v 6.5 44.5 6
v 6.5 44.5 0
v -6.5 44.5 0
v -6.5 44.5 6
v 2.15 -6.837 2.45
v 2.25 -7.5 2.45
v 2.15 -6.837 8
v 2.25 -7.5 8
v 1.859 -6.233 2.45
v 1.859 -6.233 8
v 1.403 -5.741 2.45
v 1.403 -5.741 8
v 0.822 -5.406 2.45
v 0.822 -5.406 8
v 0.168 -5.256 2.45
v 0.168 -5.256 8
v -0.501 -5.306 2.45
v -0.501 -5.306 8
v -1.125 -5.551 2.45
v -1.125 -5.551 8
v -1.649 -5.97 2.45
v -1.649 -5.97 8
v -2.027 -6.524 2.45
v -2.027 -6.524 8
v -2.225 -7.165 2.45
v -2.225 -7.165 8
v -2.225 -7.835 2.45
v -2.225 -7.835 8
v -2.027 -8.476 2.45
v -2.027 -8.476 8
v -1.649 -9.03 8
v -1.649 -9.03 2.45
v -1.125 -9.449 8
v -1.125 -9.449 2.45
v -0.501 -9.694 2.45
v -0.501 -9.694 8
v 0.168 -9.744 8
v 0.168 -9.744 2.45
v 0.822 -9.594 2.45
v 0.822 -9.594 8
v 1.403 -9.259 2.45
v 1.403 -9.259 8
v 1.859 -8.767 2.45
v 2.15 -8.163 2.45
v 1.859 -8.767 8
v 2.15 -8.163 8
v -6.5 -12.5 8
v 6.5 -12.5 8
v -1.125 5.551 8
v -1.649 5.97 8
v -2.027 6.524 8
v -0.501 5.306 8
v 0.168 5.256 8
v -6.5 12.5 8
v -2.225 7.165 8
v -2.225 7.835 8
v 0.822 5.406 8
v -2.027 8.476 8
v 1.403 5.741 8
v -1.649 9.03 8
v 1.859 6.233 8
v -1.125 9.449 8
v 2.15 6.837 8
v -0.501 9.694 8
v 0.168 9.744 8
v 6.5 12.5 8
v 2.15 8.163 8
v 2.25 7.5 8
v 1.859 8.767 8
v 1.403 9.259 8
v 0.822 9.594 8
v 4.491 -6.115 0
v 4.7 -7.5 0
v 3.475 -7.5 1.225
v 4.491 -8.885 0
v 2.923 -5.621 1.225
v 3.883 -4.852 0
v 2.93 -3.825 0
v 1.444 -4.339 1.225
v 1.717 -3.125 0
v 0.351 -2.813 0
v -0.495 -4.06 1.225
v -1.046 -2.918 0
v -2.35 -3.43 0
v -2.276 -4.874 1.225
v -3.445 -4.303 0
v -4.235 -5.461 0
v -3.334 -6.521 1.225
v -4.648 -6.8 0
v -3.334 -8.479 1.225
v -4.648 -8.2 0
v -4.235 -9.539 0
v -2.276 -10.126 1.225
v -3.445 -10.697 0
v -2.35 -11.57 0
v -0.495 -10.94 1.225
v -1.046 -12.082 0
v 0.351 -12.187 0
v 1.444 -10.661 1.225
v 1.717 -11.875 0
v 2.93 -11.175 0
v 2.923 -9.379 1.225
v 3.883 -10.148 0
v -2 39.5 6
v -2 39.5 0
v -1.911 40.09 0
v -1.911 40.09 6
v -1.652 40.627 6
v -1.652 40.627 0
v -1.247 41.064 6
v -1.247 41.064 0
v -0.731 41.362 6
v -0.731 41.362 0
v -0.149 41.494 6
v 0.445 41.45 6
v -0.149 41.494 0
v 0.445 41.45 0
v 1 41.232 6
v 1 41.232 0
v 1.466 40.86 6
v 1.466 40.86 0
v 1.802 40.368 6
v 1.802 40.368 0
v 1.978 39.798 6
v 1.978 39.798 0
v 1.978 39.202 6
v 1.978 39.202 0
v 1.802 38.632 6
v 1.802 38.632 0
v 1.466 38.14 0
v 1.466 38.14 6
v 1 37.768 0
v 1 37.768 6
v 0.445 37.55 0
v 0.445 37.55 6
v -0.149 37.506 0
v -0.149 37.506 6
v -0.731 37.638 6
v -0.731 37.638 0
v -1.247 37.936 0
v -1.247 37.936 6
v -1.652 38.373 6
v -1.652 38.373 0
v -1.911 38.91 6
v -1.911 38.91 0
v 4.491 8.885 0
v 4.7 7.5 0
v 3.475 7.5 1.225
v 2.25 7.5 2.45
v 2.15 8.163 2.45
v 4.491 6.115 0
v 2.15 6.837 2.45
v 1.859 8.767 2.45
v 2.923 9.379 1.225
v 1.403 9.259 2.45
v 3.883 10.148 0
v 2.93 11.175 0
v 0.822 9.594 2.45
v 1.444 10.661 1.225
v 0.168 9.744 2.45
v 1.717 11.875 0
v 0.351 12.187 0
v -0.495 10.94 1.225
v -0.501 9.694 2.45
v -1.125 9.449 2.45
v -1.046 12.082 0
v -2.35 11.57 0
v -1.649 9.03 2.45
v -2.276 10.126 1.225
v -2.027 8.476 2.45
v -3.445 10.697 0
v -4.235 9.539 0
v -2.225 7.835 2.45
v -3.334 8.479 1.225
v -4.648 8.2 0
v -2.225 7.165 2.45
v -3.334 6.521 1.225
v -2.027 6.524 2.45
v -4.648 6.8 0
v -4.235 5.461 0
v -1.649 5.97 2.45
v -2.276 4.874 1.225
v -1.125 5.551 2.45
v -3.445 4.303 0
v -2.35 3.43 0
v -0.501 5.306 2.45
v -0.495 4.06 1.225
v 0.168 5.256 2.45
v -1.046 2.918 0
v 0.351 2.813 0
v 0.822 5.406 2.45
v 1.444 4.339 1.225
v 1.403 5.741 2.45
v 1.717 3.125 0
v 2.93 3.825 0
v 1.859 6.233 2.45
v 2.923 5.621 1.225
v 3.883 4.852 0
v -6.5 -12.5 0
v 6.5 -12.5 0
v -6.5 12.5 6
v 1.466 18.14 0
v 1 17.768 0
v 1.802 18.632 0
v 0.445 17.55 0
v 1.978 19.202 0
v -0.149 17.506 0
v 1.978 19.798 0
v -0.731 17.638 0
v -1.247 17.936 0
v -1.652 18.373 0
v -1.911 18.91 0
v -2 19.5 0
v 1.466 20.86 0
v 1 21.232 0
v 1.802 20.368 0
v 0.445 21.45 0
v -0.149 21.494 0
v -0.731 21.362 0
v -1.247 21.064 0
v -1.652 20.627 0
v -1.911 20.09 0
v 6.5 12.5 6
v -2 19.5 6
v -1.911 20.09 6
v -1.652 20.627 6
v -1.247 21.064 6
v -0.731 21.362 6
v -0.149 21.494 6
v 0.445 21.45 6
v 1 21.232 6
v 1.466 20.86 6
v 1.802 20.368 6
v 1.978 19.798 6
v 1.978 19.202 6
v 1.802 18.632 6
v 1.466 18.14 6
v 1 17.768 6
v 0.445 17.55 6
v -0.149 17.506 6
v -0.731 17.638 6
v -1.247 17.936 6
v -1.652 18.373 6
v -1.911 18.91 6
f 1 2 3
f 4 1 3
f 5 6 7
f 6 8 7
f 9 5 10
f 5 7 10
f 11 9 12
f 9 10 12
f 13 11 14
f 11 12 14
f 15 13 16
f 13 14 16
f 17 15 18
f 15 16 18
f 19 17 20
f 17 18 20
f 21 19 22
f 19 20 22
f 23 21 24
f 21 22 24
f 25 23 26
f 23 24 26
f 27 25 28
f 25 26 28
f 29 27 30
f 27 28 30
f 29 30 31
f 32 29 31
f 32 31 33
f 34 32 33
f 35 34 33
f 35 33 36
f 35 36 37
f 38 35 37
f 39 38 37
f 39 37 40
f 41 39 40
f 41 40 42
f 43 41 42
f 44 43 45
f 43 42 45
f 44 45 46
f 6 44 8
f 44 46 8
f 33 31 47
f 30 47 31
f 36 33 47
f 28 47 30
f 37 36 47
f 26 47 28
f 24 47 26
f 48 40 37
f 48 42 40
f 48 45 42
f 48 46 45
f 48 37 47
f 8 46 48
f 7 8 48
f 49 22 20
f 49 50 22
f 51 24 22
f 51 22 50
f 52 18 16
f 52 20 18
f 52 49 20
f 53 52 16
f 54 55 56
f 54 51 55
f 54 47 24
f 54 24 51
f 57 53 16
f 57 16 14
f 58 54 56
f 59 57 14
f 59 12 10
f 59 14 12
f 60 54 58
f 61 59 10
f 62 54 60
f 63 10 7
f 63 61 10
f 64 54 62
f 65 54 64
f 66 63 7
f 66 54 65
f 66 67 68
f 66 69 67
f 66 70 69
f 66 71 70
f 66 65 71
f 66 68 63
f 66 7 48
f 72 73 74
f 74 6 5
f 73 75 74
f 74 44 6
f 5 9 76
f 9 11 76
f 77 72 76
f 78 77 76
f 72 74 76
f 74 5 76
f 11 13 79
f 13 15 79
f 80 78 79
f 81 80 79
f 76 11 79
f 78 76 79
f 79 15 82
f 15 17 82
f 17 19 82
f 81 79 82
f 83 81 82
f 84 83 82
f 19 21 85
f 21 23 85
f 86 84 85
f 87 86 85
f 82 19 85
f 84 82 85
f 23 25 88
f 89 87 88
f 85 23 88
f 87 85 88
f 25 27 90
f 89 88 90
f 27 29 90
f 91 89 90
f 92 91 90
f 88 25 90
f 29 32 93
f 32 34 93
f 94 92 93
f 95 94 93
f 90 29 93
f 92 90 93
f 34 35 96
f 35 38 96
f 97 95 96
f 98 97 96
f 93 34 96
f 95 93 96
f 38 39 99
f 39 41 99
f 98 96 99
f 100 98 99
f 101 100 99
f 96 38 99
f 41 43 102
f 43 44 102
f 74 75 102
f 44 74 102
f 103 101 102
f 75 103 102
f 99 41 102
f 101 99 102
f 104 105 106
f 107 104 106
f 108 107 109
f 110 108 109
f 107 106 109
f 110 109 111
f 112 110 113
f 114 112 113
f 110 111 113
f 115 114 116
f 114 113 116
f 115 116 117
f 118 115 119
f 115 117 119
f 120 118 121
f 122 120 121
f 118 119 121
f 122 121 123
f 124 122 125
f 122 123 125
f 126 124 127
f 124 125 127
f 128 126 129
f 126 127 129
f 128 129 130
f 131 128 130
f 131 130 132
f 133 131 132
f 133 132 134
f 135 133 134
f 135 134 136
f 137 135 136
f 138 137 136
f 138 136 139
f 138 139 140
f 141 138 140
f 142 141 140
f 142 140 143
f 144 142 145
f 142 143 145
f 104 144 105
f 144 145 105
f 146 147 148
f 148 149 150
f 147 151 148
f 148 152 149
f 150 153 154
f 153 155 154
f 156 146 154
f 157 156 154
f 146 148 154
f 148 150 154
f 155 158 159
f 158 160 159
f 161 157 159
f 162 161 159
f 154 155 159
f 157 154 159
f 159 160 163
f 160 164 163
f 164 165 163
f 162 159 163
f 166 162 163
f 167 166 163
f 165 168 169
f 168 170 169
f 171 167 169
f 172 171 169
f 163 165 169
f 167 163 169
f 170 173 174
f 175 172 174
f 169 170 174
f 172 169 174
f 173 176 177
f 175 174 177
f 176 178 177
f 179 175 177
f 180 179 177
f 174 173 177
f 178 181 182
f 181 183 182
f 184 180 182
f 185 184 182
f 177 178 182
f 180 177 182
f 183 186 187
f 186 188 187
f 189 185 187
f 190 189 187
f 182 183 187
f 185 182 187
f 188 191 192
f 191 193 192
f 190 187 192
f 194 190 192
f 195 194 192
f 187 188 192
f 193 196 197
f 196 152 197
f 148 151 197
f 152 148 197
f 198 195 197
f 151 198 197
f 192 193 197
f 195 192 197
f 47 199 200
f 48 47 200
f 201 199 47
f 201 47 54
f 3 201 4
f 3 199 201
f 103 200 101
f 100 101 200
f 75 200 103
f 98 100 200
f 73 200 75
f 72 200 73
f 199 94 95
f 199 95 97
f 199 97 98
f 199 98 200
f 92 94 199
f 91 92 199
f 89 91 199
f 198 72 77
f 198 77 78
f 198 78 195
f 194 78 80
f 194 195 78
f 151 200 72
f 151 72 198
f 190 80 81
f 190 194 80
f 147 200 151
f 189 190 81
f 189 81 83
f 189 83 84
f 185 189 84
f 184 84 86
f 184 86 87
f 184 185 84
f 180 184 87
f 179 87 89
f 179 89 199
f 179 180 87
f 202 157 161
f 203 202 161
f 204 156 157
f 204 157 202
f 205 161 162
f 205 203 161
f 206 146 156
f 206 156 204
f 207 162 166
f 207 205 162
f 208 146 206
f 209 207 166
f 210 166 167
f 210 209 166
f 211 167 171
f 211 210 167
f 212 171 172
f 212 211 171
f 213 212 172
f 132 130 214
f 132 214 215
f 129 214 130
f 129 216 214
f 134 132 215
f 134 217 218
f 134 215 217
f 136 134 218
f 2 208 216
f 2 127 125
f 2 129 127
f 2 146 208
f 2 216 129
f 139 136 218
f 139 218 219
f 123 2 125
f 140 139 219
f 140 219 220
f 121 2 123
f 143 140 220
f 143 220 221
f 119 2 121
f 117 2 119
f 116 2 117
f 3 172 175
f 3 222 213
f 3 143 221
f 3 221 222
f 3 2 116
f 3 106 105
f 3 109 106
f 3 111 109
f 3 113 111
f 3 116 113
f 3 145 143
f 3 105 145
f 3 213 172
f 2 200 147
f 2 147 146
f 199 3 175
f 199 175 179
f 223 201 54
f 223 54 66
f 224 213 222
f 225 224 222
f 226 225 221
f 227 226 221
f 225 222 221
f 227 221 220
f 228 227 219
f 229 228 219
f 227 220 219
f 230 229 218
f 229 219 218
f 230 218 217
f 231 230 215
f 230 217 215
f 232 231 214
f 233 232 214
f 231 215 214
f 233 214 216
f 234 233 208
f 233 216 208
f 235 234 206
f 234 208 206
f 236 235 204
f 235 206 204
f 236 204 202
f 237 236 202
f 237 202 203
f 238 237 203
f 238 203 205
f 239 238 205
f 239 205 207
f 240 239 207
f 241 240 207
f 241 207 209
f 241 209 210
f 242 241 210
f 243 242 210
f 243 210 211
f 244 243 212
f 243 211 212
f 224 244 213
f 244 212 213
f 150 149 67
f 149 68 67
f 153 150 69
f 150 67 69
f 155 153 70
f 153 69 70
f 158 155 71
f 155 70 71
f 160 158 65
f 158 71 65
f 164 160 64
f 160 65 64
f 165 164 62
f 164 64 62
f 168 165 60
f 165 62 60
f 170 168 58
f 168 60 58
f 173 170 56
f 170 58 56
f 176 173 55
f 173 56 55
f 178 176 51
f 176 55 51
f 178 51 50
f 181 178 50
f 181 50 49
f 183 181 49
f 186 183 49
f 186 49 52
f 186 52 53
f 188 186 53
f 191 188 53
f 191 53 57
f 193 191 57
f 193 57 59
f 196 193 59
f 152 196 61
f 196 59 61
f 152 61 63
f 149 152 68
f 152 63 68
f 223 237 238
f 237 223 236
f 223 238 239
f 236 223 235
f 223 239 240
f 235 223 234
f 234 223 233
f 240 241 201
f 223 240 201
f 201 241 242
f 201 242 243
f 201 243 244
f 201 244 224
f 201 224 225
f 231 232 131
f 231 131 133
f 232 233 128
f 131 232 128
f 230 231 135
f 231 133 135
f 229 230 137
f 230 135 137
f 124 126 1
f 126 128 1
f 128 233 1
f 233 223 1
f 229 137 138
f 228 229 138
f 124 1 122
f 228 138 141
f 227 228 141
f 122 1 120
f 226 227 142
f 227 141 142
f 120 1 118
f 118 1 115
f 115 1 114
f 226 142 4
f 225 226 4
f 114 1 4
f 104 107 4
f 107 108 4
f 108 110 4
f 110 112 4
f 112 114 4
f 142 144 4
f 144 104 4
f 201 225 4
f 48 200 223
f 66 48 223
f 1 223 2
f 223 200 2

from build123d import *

# Parameters (mm, degrees)
SKETCH1_W                                     = 13
SKETCH1_H                                     = 25
SKETCH1_R                                     = 2
BOSS_EXTRUDE1_DEPTH                           = 8
SKETCH2_W                                     = 13
SKETCH2_H                                     = 32
SKETCH2_R                                     = 2
BOSS_EXTRUDE2_DEPTH                           = 6
CSK_FOR_M4_COUNTERSUNK_FLAT_HEAD1_D           = 4.5
CSK_FOR_M4_COUNTERSUNK_FLAT_HEAD1_CSINK_D     = 9.4
CSK_FOR_M4_COUNTERSUNK_FLAT_HEAD1_CSINK_ANGLE = 90


with BuildPart() as part:
    # Sketch1 → Boss-Extrude1 (new body)
    with BuildSketch(Plane.XY):
        Rectangle(SKETCH1_W, SKETCH1_H)
        with Locations((0, -7.5)):
            Circle(SKETCH1_R, mode=Mode.SUBTRACT)
        with Locations(Location((0, 7.5, 0), (0, 0, 180))):
            Circle(SKETCH1_R, mode=Mode.SUBTRACT)
    extrude(amount=BOSS_EXTRUDE1_DEPTH)

    # Sketch2 → Boss-Extrude2 (add)
    with BuildSketch(Plane(origin=(0, 0, 0), x_dir=(-1, 0, 0), z_dir=(0, 0, -1))):
        with Locations((0, 28.5)):
            Rectangle(SKETCH2_W, SKETCH2_H)
        with Locations((0, 39.5)):
            Circle(SKETCH2_R, mode=Mode.SUBTRACT)
        with Locations((0, 19.5)):
            Circle(SKETCH2_R, mode=Mode.SUBTRACT)
    extrude(amount=-BOSS_EXTRUDE2_DEPTH)

    # CSK for M4 Countersunk Flat Head1 (through all)
    with Locations(Plane(origin=(0, 0, 0), x_dir=(-1, 0, 0), z_dir=(0, 0, -1))):
        with Locations((0, -7.5), (0, 7.5)):
            CounterSinkHole(CSK_FOR_M4_COUNTERSUNK_FLAT_HEAD1_D / 2, CSK_FOR_M4_COUNTERSUNK_FLAT_HEAD1_CSINK_D / 2, counter_sink_angle=CSK_FOR_M4_COUNTERSUNK_FLAT_HEAD1_CSINK_ANGLE)


solid = part.part
